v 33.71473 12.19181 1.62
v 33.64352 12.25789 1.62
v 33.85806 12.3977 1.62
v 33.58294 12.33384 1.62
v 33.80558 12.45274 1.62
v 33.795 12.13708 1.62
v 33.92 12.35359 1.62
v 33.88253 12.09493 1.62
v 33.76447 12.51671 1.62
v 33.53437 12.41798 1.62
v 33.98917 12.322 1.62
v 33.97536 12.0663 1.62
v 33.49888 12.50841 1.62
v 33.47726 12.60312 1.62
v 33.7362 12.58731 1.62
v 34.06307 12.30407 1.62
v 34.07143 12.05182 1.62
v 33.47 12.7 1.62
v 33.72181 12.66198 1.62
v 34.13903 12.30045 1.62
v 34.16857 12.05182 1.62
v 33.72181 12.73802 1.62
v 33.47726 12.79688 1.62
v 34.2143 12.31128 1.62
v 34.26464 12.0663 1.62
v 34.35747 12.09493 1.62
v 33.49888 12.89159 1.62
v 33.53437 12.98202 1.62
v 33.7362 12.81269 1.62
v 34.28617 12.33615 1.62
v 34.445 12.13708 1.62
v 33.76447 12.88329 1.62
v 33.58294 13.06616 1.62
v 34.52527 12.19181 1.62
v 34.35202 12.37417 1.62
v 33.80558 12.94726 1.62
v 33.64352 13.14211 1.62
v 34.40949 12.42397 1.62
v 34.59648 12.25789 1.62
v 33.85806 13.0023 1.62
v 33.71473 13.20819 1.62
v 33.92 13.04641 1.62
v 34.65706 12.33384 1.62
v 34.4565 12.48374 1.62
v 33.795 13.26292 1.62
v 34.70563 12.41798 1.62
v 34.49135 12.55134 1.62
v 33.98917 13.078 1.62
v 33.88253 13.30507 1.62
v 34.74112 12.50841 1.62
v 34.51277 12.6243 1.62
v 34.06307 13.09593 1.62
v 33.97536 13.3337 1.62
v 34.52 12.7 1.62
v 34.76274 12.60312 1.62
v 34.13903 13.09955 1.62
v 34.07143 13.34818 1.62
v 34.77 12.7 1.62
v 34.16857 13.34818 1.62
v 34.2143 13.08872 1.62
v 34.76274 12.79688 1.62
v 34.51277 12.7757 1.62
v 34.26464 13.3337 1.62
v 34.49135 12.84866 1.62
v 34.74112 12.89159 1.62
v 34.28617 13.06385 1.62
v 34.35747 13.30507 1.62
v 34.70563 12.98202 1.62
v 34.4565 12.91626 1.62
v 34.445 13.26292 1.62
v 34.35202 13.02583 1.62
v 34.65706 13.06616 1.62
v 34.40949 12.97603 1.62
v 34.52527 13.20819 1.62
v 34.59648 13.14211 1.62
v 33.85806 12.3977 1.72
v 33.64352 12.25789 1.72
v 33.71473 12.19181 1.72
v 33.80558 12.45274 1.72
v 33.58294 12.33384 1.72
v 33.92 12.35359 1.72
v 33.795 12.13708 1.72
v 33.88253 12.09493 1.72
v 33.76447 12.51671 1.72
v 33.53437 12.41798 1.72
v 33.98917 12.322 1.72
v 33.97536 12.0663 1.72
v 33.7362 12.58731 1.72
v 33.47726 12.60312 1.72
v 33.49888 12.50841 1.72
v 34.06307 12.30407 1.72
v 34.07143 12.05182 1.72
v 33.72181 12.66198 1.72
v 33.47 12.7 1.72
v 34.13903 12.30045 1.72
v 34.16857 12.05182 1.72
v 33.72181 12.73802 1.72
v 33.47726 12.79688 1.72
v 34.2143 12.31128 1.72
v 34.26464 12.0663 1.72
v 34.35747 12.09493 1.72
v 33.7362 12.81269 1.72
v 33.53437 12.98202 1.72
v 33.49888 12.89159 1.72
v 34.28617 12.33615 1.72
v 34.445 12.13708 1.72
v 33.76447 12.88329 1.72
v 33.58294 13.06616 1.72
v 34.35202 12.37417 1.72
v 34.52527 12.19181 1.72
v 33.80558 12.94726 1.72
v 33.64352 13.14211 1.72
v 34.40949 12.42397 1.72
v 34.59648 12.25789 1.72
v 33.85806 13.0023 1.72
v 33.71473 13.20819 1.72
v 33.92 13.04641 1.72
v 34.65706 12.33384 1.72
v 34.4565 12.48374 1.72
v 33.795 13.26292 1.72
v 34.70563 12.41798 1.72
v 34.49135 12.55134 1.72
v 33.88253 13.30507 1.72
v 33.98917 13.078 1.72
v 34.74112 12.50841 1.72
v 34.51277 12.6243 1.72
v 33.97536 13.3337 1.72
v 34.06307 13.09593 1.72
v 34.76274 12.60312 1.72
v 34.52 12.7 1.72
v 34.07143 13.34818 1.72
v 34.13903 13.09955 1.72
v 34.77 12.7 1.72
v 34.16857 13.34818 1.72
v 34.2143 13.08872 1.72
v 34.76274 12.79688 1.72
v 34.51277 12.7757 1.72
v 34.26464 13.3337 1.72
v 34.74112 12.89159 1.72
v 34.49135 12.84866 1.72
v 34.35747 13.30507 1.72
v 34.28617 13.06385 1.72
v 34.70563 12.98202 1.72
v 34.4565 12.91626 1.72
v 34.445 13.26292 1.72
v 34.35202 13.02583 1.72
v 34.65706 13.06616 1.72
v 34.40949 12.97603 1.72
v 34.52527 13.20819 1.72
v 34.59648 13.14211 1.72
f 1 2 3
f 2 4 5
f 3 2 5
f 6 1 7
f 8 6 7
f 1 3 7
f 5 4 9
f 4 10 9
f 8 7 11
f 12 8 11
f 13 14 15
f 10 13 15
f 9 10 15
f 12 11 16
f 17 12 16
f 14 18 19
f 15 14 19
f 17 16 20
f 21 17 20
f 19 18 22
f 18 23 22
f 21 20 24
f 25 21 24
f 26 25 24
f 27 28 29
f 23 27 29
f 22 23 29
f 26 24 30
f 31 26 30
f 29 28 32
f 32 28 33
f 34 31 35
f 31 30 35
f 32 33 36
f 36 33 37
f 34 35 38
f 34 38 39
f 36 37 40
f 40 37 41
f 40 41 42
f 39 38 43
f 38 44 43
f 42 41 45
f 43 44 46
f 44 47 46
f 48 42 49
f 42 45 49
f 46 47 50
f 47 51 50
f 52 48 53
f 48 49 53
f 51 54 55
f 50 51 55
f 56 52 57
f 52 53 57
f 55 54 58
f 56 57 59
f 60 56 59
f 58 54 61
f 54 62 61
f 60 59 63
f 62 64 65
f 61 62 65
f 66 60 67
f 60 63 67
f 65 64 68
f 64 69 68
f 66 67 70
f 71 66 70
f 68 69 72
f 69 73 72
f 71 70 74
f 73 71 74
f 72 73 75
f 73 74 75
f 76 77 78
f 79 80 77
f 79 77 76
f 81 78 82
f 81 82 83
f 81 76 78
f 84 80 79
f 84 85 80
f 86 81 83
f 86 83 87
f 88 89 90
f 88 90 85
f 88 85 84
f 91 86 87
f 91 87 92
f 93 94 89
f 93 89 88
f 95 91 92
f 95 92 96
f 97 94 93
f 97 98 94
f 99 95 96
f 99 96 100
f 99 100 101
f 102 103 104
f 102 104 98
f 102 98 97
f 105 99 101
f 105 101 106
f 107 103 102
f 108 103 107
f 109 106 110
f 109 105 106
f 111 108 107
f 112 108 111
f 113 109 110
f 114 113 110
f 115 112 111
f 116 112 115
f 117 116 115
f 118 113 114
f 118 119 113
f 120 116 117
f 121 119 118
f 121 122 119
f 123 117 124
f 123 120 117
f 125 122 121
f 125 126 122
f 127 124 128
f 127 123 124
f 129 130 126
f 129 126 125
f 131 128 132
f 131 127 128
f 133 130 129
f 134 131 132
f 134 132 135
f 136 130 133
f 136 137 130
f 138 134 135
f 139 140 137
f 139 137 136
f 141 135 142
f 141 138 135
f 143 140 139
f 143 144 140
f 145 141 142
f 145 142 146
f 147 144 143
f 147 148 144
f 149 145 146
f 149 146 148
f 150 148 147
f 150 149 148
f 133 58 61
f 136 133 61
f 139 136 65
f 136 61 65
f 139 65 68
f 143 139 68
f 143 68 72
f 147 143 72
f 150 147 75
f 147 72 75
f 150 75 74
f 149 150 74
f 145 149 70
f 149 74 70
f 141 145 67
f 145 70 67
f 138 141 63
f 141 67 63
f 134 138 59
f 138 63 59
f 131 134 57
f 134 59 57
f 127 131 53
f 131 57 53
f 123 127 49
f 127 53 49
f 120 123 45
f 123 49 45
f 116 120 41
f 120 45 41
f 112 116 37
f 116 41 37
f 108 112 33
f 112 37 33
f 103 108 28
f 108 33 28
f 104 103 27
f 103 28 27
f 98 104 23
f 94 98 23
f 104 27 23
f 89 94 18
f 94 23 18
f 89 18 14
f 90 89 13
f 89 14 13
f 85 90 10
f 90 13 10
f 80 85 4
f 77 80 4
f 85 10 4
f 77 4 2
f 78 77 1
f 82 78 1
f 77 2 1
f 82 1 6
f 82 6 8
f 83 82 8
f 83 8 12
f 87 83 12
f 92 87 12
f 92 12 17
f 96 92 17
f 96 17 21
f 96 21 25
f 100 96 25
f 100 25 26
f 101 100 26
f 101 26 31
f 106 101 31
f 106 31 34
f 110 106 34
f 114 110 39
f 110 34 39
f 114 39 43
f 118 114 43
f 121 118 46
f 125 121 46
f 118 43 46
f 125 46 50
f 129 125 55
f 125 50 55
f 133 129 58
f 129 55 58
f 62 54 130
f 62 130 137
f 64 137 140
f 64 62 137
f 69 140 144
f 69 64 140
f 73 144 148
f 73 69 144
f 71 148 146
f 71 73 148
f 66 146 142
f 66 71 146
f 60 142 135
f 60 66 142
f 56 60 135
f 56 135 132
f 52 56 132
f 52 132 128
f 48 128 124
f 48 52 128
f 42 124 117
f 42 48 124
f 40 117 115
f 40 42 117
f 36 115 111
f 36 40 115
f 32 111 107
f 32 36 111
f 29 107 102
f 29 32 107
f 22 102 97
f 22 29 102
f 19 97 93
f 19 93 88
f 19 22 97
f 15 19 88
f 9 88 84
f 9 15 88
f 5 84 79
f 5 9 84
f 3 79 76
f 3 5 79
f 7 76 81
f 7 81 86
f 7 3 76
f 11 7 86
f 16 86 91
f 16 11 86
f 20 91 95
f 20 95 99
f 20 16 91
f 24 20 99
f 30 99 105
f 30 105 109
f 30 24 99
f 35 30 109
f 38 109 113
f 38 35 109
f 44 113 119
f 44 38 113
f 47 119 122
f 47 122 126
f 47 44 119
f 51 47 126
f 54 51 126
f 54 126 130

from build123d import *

# Parameters (mm, degrees)
CYLINDER007_R     = 0.4
CYLINDER007_DEPTH = 0.1
CYLINDER006_R     = 0.65
CYLINDER006_DEPTH = 0.1


with BuildPart() as cylinder007:
    # Cylinder007 → Cylinder007 (new body)
    with BuildSketch(Plane.XY.offset(1.62)):
        Circle(CYLINDER007_R)
    extrude(amount=CYLINDER007_DEPTH)


with BuildPart() as cut018:
    # Cylinder006 → Cylinder006 (new body)
    with BuildSketch(Plane.XY.offset(1.62)):
        Circle(CYLINDER006_R)
    extrude(amount=CYLINDER006_DEPTH)

    # Cut018: cut Cylinder007
    add(cylinder007.part, mode=Mode.SUBTRACT)


with BuildPart() as cut018_1:
    # Cut018 placement: moved
    add(cut018.part.moved(Location((34.12, 12.7, 0))))


solid = cut018_1.part
